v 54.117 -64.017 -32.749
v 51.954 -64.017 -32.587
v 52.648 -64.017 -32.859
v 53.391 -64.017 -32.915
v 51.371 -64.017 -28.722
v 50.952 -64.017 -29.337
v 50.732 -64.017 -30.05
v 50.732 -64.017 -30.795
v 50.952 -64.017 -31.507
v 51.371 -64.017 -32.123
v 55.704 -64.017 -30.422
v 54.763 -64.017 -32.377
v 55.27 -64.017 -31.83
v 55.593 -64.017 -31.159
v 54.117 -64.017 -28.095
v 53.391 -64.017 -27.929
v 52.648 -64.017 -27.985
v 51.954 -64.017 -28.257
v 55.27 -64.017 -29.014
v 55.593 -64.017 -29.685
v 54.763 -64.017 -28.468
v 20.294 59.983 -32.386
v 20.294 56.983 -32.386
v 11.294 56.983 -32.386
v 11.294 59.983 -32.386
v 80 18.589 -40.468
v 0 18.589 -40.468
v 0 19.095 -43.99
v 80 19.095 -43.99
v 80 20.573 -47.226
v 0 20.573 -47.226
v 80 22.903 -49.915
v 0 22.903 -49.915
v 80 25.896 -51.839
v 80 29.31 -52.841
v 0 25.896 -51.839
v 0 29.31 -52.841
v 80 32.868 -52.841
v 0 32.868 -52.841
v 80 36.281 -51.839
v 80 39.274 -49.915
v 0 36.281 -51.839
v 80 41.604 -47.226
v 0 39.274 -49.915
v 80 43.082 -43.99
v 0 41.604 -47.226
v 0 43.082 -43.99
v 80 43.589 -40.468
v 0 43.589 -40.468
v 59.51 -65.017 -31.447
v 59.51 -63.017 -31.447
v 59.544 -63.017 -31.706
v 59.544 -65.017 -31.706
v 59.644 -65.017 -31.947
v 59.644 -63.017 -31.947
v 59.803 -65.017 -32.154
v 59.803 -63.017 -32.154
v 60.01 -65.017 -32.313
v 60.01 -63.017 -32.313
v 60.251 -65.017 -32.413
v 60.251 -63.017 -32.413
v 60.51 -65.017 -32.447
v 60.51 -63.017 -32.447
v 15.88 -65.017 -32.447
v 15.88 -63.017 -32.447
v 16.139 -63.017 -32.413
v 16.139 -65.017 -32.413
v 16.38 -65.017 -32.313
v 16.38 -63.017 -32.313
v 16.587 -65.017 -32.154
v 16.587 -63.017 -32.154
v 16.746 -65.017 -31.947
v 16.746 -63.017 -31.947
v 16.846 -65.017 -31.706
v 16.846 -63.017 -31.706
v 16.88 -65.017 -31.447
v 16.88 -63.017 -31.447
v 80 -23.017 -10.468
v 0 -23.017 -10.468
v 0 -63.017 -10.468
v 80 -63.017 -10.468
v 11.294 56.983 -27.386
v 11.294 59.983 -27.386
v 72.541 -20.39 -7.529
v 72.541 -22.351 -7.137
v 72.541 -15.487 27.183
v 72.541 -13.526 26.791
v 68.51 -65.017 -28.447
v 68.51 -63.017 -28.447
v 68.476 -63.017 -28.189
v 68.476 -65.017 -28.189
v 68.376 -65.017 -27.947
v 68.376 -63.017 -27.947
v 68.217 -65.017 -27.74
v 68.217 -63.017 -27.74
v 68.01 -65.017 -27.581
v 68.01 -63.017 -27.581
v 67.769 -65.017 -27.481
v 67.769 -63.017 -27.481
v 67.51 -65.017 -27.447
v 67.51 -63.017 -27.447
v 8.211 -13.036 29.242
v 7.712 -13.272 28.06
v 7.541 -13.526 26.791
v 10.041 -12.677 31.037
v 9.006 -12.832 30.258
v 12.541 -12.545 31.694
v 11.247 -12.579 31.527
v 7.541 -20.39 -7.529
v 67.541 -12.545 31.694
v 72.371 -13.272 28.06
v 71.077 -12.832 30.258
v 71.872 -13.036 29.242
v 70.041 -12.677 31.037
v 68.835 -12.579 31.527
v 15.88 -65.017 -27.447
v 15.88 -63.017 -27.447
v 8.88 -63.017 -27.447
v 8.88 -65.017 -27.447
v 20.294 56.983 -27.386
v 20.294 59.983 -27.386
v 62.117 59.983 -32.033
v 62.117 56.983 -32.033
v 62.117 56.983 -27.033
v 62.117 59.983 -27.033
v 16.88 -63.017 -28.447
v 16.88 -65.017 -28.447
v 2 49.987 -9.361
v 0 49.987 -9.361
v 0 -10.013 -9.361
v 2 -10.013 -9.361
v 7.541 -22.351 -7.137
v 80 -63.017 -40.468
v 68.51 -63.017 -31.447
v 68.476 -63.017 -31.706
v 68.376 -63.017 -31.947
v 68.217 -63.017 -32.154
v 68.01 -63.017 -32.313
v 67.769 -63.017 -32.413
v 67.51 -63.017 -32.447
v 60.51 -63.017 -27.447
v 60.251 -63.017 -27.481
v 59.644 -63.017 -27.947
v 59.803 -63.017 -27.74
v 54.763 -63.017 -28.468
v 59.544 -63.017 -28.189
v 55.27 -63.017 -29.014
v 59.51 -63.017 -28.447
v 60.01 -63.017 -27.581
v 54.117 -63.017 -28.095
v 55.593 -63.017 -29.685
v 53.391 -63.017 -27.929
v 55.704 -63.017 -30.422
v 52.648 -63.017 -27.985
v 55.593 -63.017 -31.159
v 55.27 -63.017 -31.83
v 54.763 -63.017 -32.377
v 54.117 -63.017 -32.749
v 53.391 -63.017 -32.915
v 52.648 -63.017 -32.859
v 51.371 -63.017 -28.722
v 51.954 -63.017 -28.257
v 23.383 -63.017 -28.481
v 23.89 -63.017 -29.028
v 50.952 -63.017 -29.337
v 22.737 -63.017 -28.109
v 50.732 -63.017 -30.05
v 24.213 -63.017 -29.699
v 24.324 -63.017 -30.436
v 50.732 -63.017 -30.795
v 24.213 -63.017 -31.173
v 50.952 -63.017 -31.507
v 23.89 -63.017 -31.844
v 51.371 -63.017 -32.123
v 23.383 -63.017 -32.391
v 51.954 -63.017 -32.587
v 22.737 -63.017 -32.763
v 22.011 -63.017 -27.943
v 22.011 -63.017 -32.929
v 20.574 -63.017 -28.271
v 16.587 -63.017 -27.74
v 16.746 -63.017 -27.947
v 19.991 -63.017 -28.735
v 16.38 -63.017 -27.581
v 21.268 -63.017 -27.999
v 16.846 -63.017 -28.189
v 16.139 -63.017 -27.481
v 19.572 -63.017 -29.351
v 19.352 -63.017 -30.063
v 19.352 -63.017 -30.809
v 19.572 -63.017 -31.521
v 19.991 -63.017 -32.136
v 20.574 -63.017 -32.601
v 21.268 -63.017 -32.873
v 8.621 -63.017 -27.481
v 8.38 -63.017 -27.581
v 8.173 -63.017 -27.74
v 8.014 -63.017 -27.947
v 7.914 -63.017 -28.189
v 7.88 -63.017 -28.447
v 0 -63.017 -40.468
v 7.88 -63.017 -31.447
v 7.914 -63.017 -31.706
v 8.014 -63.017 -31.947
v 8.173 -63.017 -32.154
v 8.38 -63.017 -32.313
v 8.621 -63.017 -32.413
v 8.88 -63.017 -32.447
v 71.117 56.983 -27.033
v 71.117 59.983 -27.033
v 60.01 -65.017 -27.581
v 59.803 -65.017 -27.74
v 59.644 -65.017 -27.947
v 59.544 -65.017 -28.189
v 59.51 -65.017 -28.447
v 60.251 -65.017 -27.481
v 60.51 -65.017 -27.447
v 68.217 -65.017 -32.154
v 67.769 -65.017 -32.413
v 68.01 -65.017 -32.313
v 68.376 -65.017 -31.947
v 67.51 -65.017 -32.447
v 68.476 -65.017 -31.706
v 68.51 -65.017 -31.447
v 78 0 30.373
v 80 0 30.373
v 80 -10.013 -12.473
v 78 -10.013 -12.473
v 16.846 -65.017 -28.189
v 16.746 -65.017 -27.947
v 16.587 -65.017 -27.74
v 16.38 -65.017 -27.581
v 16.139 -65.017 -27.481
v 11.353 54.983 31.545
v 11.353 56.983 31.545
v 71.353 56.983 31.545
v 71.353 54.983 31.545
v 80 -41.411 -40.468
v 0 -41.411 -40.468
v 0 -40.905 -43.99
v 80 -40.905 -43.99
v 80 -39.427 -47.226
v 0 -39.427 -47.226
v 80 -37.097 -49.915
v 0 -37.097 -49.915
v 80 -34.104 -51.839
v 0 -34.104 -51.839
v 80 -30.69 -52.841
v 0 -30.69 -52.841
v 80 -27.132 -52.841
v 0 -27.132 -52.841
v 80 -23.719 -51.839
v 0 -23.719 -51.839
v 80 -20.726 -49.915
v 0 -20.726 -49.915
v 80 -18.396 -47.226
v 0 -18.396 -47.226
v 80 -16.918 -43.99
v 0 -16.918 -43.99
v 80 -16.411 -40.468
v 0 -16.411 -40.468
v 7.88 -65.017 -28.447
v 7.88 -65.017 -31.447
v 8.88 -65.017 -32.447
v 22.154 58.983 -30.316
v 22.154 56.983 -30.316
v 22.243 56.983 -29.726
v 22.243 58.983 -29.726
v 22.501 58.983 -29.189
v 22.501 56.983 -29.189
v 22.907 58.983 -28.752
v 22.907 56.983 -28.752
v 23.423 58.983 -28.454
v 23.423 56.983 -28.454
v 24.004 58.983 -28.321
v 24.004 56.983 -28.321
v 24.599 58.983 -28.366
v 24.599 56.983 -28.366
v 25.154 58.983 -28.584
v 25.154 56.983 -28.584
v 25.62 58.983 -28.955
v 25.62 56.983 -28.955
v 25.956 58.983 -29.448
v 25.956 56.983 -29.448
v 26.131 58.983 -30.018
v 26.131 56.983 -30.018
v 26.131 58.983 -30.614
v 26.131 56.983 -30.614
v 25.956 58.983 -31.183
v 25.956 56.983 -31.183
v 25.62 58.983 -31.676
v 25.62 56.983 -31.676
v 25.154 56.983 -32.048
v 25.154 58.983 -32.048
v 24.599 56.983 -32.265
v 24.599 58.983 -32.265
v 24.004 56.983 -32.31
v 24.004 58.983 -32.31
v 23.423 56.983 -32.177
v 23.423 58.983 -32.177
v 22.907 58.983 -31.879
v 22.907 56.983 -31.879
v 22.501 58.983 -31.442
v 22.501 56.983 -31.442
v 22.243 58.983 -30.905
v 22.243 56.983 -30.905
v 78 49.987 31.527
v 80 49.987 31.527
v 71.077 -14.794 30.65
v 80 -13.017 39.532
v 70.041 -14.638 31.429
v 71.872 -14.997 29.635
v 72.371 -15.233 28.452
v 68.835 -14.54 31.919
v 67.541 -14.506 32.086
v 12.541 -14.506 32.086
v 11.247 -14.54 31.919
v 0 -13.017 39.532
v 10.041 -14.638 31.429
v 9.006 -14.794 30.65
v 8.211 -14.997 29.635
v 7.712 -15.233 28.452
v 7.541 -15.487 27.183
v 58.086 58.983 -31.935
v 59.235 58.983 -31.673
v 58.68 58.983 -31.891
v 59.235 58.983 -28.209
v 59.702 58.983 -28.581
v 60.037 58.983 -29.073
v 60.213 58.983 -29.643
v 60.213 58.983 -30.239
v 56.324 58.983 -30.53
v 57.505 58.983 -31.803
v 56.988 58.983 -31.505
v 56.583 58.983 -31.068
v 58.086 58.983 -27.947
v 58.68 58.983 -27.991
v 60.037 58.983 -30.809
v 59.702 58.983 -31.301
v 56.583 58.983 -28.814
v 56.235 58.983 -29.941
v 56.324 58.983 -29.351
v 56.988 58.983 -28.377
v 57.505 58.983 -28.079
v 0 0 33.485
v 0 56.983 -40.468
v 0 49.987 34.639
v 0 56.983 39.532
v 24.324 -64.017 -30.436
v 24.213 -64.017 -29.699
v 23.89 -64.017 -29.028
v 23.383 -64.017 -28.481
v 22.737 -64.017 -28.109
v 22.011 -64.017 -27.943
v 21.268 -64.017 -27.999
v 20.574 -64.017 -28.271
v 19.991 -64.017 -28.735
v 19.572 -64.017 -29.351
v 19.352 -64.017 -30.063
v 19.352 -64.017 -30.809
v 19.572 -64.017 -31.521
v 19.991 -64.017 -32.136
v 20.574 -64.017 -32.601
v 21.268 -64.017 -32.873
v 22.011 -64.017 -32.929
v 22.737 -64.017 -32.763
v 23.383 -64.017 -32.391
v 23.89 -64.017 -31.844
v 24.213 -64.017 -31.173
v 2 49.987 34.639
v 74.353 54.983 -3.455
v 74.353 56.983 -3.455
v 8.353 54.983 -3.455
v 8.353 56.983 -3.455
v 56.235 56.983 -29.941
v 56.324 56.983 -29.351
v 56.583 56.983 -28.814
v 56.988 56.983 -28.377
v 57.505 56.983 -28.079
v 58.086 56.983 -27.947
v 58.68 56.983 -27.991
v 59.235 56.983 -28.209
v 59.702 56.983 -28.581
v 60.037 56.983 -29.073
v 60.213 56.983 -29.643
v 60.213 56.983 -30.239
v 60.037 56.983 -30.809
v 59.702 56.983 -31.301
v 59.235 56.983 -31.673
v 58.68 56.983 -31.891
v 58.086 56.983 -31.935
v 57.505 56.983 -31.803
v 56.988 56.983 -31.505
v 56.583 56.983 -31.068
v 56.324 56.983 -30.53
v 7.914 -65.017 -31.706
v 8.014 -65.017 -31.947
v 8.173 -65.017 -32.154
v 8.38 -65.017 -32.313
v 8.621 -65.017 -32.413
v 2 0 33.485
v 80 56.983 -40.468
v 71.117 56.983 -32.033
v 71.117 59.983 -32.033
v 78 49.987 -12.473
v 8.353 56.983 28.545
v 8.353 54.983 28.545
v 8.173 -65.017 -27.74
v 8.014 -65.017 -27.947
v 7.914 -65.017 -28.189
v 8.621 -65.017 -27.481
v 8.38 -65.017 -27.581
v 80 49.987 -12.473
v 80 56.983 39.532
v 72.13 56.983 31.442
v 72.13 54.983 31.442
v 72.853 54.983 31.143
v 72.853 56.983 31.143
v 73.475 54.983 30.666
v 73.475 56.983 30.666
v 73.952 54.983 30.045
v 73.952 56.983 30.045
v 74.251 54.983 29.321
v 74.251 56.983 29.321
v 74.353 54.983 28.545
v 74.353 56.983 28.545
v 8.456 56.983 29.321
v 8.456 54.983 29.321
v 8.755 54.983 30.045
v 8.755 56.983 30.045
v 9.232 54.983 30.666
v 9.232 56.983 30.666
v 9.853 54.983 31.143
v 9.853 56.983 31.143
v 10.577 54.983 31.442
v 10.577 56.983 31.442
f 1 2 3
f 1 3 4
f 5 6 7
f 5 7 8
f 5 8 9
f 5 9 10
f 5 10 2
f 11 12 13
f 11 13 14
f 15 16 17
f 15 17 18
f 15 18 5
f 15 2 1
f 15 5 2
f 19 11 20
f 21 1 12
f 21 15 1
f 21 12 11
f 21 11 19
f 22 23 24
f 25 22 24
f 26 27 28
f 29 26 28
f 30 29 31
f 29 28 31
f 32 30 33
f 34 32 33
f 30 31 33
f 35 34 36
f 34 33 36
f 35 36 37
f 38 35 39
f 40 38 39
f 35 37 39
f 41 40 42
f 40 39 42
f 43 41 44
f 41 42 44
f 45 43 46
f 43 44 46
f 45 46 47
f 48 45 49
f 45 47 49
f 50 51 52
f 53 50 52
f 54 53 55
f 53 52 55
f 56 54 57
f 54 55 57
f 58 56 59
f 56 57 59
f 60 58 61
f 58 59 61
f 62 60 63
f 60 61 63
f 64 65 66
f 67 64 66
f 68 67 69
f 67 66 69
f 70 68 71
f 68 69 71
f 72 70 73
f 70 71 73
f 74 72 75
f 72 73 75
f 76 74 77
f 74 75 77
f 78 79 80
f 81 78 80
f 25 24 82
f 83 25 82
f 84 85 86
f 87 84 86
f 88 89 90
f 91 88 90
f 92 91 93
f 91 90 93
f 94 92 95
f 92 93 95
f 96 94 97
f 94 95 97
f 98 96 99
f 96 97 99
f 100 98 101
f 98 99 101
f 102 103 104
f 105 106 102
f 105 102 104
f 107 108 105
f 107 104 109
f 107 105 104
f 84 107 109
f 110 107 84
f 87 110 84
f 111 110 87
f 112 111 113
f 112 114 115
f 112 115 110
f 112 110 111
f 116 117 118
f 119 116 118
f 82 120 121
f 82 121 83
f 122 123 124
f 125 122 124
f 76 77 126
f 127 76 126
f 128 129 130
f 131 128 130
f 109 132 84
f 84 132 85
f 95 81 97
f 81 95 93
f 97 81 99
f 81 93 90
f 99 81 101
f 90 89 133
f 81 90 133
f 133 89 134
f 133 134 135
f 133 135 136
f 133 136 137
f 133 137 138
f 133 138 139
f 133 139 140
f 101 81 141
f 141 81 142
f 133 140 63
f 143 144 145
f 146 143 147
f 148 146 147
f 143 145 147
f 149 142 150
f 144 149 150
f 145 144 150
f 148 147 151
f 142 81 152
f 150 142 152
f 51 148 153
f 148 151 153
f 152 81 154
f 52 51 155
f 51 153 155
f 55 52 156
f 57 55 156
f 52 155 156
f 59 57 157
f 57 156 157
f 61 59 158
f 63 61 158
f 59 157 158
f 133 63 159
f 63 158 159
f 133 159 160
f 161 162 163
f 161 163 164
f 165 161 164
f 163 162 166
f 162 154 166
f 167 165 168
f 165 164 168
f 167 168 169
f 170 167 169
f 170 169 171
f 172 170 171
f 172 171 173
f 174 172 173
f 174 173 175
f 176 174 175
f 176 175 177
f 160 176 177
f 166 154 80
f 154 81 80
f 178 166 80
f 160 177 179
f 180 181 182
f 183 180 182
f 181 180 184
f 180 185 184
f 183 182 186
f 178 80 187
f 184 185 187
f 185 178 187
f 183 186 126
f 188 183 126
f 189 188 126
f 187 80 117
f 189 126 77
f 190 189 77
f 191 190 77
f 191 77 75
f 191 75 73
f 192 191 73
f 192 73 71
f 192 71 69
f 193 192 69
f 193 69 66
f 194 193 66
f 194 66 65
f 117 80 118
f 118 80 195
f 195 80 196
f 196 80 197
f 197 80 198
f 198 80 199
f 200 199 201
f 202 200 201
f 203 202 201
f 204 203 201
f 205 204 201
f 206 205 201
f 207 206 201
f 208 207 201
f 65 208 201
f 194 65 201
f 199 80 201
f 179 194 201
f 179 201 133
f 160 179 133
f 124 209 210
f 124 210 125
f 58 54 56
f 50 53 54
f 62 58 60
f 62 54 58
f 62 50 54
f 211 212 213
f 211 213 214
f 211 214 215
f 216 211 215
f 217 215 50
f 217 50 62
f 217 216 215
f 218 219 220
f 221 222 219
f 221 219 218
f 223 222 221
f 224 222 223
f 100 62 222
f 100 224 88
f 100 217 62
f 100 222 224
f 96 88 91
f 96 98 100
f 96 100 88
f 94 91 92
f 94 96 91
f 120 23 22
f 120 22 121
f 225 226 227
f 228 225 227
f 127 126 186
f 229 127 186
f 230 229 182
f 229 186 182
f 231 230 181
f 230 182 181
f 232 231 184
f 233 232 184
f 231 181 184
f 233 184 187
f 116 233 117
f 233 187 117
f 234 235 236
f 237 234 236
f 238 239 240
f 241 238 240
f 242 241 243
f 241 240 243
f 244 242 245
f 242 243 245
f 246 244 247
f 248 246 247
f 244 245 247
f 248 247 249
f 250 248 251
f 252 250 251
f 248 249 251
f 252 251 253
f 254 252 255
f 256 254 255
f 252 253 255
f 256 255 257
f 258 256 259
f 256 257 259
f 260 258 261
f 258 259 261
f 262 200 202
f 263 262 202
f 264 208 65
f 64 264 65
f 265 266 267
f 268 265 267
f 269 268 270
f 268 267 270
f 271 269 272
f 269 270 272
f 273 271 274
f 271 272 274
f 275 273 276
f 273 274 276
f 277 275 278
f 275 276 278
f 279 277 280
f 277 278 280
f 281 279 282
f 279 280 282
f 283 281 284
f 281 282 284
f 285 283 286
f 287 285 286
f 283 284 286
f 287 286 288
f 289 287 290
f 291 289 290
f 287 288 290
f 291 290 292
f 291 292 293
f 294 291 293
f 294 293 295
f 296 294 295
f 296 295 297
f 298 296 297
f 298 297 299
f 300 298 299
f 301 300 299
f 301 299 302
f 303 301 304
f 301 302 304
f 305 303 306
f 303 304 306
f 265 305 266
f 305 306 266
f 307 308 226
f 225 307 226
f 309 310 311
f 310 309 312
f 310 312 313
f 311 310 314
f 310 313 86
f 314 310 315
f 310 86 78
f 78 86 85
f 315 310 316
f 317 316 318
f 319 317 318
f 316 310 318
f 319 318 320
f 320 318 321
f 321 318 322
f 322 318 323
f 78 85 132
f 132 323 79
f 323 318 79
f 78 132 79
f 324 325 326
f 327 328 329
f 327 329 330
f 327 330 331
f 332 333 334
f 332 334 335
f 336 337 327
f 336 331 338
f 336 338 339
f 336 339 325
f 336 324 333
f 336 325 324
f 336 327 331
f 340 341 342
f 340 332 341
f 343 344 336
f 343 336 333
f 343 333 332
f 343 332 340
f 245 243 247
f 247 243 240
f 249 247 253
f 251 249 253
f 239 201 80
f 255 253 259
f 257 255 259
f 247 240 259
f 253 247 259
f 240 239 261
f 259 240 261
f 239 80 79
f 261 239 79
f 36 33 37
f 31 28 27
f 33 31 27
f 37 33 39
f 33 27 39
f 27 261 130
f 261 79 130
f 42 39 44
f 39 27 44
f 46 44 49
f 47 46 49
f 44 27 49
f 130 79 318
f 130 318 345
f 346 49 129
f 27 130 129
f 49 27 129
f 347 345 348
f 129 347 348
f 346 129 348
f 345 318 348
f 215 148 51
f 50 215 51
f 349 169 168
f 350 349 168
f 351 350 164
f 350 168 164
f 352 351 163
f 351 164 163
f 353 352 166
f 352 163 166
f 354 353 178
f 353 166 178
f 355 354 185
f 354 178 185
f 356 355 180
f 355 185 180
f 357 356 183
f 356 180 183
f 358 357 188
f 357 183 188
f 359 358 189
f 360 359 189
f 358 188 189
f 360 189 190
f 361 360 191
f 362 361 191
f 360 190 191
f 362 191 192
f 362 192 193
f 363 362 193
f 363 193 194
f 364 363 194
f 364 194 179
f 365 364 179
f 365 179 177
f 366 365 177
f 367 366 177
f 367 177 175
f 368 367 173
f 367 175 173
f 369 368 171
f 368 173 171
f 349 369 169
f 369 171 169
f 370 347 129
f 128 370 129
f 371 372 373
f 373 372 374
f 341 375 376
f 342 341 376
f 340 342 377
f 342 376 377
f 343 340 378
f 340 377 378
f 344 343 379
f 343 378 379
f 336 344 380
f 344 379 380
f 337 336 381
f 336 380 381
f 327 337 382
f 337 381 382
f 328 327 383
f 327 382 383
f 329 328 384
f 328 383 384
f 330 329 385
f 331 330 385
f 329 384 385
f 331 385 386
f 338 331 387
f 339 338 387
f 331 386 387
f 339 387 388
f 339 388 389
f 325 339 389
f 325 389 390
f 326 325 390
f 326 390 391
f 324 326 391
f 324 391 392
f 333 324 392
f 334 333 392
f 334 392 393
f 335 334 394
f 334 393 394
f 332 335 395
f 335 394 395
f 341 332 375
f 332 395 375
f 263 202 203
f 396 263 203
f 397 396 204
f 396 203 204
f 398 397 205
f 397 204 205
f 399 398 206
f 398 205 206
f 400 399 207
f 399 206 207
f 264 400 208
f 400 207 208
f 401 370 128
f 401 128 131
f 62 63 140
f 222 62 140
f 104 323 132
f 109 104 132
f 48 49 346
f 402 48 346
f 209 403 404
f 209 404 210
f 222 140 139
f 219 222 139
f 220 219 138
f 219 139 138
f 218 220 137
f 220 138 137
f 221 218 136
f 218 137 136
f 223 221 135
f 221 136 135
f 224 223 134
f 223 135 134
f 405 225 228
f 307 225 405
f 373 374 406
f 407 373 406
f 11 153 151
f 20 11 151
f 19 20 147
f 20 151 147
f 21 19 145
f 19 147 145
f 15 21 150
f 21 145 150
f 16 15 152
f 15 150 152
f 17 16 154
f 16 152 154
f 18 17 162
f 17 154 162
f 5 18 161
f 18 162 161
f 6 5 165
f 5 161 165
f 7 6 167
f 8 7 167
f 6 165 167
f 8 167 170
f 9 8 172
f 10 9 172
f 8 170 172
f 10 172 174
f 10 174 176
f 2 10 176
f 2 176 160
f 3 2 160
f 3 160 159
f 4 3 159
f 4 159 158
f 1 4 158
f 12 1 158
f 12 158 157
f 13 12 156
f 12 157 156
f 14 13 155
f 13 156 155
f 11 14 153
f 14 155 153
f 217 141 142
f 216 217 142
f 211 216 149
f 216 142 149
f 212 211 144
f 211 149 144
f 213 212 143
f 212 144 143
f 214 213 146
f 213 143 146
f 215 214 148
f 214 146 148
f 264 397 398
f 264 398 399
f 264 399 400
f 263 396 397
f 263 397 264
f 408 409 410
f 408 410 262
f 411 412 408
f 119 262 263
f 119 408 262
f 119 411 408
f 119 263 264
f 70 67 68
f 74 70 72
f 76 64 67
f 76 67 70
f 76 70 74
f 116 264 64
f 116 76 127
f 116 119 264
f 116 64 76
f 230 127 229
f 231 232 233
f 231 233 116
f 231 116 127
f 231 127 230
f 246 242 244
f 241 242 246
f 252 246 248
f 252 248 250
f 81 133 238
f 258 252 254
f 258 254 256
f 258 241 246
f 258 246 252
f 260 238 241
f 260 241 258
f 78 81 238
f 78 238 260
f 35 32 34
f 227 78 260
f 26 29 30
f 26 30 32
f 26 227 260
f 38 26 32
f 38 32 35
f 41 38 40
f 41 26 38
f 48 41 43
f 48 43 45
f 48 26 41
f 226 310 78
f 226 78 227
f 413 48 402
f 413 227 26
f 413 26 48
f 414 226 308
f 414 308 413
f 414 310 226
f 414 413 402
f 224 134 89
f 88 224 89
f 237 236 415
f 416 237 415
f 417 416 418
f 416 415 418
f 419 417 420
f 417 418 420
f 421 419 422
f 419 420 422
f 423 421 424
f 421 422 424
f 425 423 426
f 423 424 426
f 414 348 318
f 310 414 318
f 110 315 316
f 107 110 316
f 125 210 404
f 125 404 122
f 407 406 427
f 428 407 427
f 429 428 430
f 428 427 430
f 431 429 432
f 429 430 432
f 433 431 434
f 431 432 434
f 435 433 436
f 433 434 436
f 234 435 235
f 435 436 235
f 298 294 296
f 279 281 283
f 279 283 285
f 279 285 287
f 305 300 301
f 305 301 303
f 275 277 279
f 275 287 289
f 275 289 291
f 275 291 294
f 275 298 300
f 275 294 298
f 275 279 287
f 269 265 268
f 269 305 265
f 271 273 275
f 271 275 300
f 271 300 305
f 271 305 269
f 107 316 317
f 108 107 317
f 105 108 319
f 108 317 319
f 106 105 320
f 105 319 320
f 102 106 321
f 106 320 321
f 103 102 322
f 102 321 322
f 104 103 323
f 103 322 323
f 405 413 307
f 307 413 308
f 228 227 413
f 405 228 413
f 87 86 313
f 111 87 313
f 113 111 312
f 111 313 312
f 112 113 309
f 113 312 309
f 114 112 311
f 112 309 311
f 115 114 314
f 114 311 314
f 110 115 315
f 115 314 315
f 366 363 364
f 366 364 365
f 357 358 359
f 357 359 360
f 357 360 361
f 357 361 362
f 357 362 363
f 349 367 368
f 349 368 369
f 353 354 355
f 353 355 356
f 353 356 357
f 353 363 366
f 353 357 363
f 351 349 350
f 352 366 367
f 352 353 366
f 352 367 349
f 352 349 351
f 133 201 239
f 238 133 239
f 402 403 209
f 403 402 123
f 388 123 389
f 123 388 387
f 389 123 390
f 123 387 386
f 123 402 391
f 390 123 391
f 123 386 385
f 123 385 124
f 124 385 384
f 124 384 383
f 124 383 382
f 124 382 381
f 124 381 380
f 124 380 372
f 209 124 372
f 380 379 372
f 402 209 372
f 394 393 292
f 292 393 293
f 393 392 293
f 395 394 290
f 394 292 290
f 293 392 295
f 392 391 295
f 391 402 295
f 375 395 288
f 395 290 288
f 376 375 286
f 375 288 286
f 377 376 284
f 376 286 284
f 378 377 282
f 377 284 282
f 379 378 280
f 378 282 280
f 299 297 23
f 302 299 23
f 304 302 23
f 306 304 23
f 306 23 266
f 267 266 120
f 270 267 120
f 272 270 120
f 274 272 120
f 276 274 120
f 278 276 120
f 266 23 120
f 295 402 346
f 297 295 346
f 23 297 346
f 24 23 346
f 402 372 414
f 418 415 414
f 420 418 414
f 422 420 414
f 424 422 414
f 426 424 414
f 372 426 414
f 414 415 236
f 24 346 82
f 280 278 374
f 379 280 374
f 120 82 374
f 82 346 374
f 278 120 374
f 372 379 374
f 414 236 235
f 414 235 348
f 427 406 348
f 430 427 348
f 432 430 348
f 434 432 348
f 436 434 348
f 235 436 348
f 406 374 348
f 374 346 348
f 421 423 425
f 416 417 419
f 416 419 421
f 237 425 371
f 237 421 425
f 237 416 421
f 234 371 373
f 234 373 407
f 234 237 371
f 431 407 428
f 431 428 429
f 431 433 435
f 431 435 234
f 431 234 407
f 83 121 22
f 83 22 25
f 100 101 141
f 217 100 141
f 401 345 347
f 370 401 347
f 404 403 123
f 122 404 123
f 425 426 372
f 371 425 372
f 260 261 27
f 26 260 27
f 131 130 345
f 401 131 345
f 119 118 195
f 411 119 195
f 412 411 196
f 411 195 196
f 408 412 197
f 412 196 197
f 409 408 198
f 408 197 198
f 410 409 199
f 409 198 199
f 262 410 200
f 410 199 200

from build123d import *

# Parameters (mm, degrees)
F1_DEPTH  = 80
F3_DEPTH  = 2
F5_DEPTH  = 2
F7_DEPTH  = 2
F9_DEPTH  = 2
F10_R     = 2.5
F11_DEPTH = 1
F13_DEPTH = 2
F14_W     = 9
F14_H     = 5
F15_DEPTH = 3
F16_R     = 2
F17_DEPTH = 2


with BuildPart() as f1:
    # F0 (on Right) → F1 (new body)
    with BuildSketch(Plane.YZ):
        with BuildLine():
            Line((56.9827339551, -40.4682084375), (56.9827339551, 39.5317915625))
            Line((56.9827339551, 39.5317915625), (-13.0172660449, 39.5317915625))
            Line((-13.0172660449, 39.5317915625), (-23.0172660449, -10.4682084375))
            Line((-23.0172660449, -10.4682084375), (-63.0172660449, -10.4682084375))
            Line((-63.0172660449, -10.4682084375), (-63.0172660449, -40.4682084375))
            Line((-63.0172660449, -40.4682084375), (-41.4112906903, -40.4682084375))
            ThreePointArc((-41.4112906903, -40.4682084375), (-28.9112906903, -27.9682084375), (-16.4112906903, -40.4682084375))
            Line((-16.4112906903, -40.4682084375), (18.5887116939, -40.4682084375))
            ThreePointArc((18.5887116939, -40.4682084375), (31.0887116939, -27.9682084375), (43.5887116939, -40.4682084375))
            Line((43.5887116939, -40.4682084375), (56.9827339551, -40.4682084375))
        make_face()
        with BuildLine():
            Line((-41.4112906903, -40.4682084375), (-16.4112906903, -40.4682084375))
            ThreePointArc((-16.4112906903, -40.4682084375), (-28.9112906903, -27.9682084375), (-41.4112906903, -40.4682084375))
        make_face()
        with BuildLine():
            ThreePointArc((-41.4112906903, -40.4682084375), (-28.9112906903, -52.9682084375), (-16.4112906903, -40.4682084375))
            Line((-16.4112906903, -40.4682084375), (-41.4112906903, -40.4682084375))
        make_face()
        with BuildLine():
            ThreePointArc((18.5887116939, -40.4682084375), (31.0887116939, -52.9682084375), (43.5887116939, -40.4682084375))
            Line((43.5887116939, -40.4682084375), (18.5887116939, -40.4682084375))
        make_face()
        with BuildLine():
            Line((18.5887116939, -40.4682084375), (43.5887116939, -40.4682084375))
            ThreePointArc((43.5887116939, -40.4682084375), (31.0887116939, -27.9682084375), (18.5887116939, -40.4682084375))
        make_face()
    extrude(amount=F1_DEPTH)

    # F2 (on face) → F3 (cut)
    with BuildSketch(Plane.YZ.offset(80)):
        Polygon((49.9866685293, 31.5270468074), (0, 30.3725038928), (-10.0133314707, -12.4729531926), (49.9866685293, -12.4729531926), align=None)
    extrude(amount=-F3_DEPTH, mode=Mode.SUBTRACT)

    # F4 (on face) → F5 (cut)
    with BuildSketch(Plane(origin=(0, 0, 0), x_dir=(0, -1, 0), z_dir=(-1, 0, 0))):
        Polygon((10.0133314707, -9.3607458684), (0, 33.484711217), (-49.9866685293, 34.6392541316), (-49.9866685293, -9.3607458684), align=None)
    extrude(amount=-F5_DEPTH, mode=Mode.SUBTRACT)

    # F6 (on face) → F7 (cut)
    with BuildSketch(Plane(origin=(0, -20.1188695744, 4.0237739149), x_dir=(1, 0, 0), z_dir=(0, -0.9805806757, 0.1961161351))):
        with BuildLine():
            ThreePointArc((12.5413901359, 28.6179297172), (9.00585623, 27.1534636231), (7.5413901359, 23.6179297172))
            Line((7.5413901359, 23.6179297172), (7.5413901359, -11.3820702828))
            Line((7.5413901359, -11.3820702828), (72.5413901359, -11.3820702828))
            Line((72.5413901359, -11.3820702828), (72.5413901359, 23.6179297172))
            ThreePointArc((72.5413901359, 23.6179297172), (71.0769240418, 27.1534636231), (67.5413901359, 28.6179297172))
            Line((67.5413901359, 28.6179297172), (12.5413901359, 28.6179297172))
        make_face()
    extrude(amount=-F7_DEPTH, mode=Mode.SUBTRACT)

    # F8 (on face) → F9 (join)
    with BuildSketch(Plane.XZ.offset(63.0172660449)):
        with BuildLine():
            ThreePointArc((16.8799156292, -28.4473337126), (16.5870224104, -27.7402269314), (15.8799156292, -27.4473337126))
            Line((15.8799156292, -27.4473337126), (8.8799156292, -27.4473337126))
            ThreePointArc((8.8799156292, -27.4473337126), (8.172808848, -27.7402269314), (7.8799156292, -28.4473337126))
            Line((7.8799156292, -28.4473337126), (7.8799156292, -31.4473337126))
            ThreePointArc((7.8799156292, -31.4473337126), (8.172808848, -32.1544404937), (8.8799156292, -32.4473337126))
            Line((8.8799156292, -32.4473337126), (15.8799156292, -32.4473337126))
            ThreePointArc((15.8799156292, -32.4473337126), (16.5870224104, -32.1544404937), (16.8799156292, -31.4473337126))
            Line((16.8799156292, -31.4473337126), (16.8799156292, -28.4473337126))
        make_face()
        with BuildLine():
            ThreePointArc((68.5099807539, -28.4473337126), (68.2170875351, -27.7402269314), (67.5099807539, -27.4473337126))
            Line((67.5099807539, -27.4473337126), (60.5099807539, -27.4473337126))
            ThreePointArc((60.5099807539, -27.4473337126), (59.8028739727, -27.7402269314), (59.5099807539, -28.4473337126))
            Line((59.5099807539, -28.4473337126), (59.5099807539, -31.4473337126))
            ThreePointArc((59.5099807539, -31.4473337126), (59.8028739727, -32.1544404937), (60.5099807539, -32.4473337126))
            Line((60.5099807539, -32.4473337126), (67.5099807539, -32.4473337126))
            ThreePointArc((67.5099807539, -32.4473337126), (68.2170875351, -32.1544404937), (68.5099807539, -31.4473337126))
            Line((68.5099807539, -31.4473337126), (68.5099807539, -28.4473337126))
        make_face()
    extrude(amount=F9_DEPTH)

    # F10 (on face) → F11 (join)
    with BuildSketch(Plane.XZ.offset(63.0172660449)):
        with Locations((21.8240363776, -30.4359253496)):
            Circle(F10_R)
        with Locations((53.2039631238, -30.4221354475)):
            Circle(F10_R)
    extrude(amount=F11_DEPTH)

    # F12 (on face) → F13 (cut)
    with BuildSketch(Plane(origin=(0, 56.9827339551, 0), x_dir=(-1, 0, 0), z_dir=(0, 1, 0))):
        with BuildLine():
            Line((-11.3534486648, 31.5445680549), (-71.3534486648, 31.5445680549))
            ThreePointArc((-71.3534486648, 31.5445680549), (-73.4747690083, 30.6658883985), (-74.3534486648, 28.5445680549))
            Line((-74.3534486648, 28.5445680549), (-74.3534486648, -3.4554319451))
            Line((-74.3534486648, -3.4554319451), (-8.3534486648, -3.4554319451))
            Line((-8.3534486648, -3.4554319451), (-8.3534486648, 28.5445680549))
            ThreePointArc((-8.3534486648, 28.5445680549), (-9.2321283212, 30.6658883985), (-11.3534486648, 31.5445680549))
        make_face()
    extrude(amount=-F13_DEPTH, mode=Mode.SUBTRACT)

    # F14 (on face) → F15 (join)
    with BuildSketch(Plane(origin=(0, 56.9827339551, 0), x_dir=(-1, 0, 0), z_dir=(0, 1, 0))):
        with Locations((-66.6173999912, -29.532836911)):
            Rectangle(F14_W, F14_H)
        with Locations((-15.7938591157, -29.8857766254)):
            Rectangle(F14_W, F14_H)
    extrude(amount=F15_DEPTH)

    # F16 (on face) → F17 (join)
    with BuildSketch(Plane(origin=(0, 56.9827339551, 0), x_dir=(-1, 0, 0), z_dir=(0, 1, 0))):
        with Locations((-24.1537547966, -30.3156095468)):
            Circle(F16_R)
        with Locations((-58.2354065123, -29.9409476741)):
            Circle(F16_R)
    extrude(amount=F17_DEPTH)


solid = f1.part
